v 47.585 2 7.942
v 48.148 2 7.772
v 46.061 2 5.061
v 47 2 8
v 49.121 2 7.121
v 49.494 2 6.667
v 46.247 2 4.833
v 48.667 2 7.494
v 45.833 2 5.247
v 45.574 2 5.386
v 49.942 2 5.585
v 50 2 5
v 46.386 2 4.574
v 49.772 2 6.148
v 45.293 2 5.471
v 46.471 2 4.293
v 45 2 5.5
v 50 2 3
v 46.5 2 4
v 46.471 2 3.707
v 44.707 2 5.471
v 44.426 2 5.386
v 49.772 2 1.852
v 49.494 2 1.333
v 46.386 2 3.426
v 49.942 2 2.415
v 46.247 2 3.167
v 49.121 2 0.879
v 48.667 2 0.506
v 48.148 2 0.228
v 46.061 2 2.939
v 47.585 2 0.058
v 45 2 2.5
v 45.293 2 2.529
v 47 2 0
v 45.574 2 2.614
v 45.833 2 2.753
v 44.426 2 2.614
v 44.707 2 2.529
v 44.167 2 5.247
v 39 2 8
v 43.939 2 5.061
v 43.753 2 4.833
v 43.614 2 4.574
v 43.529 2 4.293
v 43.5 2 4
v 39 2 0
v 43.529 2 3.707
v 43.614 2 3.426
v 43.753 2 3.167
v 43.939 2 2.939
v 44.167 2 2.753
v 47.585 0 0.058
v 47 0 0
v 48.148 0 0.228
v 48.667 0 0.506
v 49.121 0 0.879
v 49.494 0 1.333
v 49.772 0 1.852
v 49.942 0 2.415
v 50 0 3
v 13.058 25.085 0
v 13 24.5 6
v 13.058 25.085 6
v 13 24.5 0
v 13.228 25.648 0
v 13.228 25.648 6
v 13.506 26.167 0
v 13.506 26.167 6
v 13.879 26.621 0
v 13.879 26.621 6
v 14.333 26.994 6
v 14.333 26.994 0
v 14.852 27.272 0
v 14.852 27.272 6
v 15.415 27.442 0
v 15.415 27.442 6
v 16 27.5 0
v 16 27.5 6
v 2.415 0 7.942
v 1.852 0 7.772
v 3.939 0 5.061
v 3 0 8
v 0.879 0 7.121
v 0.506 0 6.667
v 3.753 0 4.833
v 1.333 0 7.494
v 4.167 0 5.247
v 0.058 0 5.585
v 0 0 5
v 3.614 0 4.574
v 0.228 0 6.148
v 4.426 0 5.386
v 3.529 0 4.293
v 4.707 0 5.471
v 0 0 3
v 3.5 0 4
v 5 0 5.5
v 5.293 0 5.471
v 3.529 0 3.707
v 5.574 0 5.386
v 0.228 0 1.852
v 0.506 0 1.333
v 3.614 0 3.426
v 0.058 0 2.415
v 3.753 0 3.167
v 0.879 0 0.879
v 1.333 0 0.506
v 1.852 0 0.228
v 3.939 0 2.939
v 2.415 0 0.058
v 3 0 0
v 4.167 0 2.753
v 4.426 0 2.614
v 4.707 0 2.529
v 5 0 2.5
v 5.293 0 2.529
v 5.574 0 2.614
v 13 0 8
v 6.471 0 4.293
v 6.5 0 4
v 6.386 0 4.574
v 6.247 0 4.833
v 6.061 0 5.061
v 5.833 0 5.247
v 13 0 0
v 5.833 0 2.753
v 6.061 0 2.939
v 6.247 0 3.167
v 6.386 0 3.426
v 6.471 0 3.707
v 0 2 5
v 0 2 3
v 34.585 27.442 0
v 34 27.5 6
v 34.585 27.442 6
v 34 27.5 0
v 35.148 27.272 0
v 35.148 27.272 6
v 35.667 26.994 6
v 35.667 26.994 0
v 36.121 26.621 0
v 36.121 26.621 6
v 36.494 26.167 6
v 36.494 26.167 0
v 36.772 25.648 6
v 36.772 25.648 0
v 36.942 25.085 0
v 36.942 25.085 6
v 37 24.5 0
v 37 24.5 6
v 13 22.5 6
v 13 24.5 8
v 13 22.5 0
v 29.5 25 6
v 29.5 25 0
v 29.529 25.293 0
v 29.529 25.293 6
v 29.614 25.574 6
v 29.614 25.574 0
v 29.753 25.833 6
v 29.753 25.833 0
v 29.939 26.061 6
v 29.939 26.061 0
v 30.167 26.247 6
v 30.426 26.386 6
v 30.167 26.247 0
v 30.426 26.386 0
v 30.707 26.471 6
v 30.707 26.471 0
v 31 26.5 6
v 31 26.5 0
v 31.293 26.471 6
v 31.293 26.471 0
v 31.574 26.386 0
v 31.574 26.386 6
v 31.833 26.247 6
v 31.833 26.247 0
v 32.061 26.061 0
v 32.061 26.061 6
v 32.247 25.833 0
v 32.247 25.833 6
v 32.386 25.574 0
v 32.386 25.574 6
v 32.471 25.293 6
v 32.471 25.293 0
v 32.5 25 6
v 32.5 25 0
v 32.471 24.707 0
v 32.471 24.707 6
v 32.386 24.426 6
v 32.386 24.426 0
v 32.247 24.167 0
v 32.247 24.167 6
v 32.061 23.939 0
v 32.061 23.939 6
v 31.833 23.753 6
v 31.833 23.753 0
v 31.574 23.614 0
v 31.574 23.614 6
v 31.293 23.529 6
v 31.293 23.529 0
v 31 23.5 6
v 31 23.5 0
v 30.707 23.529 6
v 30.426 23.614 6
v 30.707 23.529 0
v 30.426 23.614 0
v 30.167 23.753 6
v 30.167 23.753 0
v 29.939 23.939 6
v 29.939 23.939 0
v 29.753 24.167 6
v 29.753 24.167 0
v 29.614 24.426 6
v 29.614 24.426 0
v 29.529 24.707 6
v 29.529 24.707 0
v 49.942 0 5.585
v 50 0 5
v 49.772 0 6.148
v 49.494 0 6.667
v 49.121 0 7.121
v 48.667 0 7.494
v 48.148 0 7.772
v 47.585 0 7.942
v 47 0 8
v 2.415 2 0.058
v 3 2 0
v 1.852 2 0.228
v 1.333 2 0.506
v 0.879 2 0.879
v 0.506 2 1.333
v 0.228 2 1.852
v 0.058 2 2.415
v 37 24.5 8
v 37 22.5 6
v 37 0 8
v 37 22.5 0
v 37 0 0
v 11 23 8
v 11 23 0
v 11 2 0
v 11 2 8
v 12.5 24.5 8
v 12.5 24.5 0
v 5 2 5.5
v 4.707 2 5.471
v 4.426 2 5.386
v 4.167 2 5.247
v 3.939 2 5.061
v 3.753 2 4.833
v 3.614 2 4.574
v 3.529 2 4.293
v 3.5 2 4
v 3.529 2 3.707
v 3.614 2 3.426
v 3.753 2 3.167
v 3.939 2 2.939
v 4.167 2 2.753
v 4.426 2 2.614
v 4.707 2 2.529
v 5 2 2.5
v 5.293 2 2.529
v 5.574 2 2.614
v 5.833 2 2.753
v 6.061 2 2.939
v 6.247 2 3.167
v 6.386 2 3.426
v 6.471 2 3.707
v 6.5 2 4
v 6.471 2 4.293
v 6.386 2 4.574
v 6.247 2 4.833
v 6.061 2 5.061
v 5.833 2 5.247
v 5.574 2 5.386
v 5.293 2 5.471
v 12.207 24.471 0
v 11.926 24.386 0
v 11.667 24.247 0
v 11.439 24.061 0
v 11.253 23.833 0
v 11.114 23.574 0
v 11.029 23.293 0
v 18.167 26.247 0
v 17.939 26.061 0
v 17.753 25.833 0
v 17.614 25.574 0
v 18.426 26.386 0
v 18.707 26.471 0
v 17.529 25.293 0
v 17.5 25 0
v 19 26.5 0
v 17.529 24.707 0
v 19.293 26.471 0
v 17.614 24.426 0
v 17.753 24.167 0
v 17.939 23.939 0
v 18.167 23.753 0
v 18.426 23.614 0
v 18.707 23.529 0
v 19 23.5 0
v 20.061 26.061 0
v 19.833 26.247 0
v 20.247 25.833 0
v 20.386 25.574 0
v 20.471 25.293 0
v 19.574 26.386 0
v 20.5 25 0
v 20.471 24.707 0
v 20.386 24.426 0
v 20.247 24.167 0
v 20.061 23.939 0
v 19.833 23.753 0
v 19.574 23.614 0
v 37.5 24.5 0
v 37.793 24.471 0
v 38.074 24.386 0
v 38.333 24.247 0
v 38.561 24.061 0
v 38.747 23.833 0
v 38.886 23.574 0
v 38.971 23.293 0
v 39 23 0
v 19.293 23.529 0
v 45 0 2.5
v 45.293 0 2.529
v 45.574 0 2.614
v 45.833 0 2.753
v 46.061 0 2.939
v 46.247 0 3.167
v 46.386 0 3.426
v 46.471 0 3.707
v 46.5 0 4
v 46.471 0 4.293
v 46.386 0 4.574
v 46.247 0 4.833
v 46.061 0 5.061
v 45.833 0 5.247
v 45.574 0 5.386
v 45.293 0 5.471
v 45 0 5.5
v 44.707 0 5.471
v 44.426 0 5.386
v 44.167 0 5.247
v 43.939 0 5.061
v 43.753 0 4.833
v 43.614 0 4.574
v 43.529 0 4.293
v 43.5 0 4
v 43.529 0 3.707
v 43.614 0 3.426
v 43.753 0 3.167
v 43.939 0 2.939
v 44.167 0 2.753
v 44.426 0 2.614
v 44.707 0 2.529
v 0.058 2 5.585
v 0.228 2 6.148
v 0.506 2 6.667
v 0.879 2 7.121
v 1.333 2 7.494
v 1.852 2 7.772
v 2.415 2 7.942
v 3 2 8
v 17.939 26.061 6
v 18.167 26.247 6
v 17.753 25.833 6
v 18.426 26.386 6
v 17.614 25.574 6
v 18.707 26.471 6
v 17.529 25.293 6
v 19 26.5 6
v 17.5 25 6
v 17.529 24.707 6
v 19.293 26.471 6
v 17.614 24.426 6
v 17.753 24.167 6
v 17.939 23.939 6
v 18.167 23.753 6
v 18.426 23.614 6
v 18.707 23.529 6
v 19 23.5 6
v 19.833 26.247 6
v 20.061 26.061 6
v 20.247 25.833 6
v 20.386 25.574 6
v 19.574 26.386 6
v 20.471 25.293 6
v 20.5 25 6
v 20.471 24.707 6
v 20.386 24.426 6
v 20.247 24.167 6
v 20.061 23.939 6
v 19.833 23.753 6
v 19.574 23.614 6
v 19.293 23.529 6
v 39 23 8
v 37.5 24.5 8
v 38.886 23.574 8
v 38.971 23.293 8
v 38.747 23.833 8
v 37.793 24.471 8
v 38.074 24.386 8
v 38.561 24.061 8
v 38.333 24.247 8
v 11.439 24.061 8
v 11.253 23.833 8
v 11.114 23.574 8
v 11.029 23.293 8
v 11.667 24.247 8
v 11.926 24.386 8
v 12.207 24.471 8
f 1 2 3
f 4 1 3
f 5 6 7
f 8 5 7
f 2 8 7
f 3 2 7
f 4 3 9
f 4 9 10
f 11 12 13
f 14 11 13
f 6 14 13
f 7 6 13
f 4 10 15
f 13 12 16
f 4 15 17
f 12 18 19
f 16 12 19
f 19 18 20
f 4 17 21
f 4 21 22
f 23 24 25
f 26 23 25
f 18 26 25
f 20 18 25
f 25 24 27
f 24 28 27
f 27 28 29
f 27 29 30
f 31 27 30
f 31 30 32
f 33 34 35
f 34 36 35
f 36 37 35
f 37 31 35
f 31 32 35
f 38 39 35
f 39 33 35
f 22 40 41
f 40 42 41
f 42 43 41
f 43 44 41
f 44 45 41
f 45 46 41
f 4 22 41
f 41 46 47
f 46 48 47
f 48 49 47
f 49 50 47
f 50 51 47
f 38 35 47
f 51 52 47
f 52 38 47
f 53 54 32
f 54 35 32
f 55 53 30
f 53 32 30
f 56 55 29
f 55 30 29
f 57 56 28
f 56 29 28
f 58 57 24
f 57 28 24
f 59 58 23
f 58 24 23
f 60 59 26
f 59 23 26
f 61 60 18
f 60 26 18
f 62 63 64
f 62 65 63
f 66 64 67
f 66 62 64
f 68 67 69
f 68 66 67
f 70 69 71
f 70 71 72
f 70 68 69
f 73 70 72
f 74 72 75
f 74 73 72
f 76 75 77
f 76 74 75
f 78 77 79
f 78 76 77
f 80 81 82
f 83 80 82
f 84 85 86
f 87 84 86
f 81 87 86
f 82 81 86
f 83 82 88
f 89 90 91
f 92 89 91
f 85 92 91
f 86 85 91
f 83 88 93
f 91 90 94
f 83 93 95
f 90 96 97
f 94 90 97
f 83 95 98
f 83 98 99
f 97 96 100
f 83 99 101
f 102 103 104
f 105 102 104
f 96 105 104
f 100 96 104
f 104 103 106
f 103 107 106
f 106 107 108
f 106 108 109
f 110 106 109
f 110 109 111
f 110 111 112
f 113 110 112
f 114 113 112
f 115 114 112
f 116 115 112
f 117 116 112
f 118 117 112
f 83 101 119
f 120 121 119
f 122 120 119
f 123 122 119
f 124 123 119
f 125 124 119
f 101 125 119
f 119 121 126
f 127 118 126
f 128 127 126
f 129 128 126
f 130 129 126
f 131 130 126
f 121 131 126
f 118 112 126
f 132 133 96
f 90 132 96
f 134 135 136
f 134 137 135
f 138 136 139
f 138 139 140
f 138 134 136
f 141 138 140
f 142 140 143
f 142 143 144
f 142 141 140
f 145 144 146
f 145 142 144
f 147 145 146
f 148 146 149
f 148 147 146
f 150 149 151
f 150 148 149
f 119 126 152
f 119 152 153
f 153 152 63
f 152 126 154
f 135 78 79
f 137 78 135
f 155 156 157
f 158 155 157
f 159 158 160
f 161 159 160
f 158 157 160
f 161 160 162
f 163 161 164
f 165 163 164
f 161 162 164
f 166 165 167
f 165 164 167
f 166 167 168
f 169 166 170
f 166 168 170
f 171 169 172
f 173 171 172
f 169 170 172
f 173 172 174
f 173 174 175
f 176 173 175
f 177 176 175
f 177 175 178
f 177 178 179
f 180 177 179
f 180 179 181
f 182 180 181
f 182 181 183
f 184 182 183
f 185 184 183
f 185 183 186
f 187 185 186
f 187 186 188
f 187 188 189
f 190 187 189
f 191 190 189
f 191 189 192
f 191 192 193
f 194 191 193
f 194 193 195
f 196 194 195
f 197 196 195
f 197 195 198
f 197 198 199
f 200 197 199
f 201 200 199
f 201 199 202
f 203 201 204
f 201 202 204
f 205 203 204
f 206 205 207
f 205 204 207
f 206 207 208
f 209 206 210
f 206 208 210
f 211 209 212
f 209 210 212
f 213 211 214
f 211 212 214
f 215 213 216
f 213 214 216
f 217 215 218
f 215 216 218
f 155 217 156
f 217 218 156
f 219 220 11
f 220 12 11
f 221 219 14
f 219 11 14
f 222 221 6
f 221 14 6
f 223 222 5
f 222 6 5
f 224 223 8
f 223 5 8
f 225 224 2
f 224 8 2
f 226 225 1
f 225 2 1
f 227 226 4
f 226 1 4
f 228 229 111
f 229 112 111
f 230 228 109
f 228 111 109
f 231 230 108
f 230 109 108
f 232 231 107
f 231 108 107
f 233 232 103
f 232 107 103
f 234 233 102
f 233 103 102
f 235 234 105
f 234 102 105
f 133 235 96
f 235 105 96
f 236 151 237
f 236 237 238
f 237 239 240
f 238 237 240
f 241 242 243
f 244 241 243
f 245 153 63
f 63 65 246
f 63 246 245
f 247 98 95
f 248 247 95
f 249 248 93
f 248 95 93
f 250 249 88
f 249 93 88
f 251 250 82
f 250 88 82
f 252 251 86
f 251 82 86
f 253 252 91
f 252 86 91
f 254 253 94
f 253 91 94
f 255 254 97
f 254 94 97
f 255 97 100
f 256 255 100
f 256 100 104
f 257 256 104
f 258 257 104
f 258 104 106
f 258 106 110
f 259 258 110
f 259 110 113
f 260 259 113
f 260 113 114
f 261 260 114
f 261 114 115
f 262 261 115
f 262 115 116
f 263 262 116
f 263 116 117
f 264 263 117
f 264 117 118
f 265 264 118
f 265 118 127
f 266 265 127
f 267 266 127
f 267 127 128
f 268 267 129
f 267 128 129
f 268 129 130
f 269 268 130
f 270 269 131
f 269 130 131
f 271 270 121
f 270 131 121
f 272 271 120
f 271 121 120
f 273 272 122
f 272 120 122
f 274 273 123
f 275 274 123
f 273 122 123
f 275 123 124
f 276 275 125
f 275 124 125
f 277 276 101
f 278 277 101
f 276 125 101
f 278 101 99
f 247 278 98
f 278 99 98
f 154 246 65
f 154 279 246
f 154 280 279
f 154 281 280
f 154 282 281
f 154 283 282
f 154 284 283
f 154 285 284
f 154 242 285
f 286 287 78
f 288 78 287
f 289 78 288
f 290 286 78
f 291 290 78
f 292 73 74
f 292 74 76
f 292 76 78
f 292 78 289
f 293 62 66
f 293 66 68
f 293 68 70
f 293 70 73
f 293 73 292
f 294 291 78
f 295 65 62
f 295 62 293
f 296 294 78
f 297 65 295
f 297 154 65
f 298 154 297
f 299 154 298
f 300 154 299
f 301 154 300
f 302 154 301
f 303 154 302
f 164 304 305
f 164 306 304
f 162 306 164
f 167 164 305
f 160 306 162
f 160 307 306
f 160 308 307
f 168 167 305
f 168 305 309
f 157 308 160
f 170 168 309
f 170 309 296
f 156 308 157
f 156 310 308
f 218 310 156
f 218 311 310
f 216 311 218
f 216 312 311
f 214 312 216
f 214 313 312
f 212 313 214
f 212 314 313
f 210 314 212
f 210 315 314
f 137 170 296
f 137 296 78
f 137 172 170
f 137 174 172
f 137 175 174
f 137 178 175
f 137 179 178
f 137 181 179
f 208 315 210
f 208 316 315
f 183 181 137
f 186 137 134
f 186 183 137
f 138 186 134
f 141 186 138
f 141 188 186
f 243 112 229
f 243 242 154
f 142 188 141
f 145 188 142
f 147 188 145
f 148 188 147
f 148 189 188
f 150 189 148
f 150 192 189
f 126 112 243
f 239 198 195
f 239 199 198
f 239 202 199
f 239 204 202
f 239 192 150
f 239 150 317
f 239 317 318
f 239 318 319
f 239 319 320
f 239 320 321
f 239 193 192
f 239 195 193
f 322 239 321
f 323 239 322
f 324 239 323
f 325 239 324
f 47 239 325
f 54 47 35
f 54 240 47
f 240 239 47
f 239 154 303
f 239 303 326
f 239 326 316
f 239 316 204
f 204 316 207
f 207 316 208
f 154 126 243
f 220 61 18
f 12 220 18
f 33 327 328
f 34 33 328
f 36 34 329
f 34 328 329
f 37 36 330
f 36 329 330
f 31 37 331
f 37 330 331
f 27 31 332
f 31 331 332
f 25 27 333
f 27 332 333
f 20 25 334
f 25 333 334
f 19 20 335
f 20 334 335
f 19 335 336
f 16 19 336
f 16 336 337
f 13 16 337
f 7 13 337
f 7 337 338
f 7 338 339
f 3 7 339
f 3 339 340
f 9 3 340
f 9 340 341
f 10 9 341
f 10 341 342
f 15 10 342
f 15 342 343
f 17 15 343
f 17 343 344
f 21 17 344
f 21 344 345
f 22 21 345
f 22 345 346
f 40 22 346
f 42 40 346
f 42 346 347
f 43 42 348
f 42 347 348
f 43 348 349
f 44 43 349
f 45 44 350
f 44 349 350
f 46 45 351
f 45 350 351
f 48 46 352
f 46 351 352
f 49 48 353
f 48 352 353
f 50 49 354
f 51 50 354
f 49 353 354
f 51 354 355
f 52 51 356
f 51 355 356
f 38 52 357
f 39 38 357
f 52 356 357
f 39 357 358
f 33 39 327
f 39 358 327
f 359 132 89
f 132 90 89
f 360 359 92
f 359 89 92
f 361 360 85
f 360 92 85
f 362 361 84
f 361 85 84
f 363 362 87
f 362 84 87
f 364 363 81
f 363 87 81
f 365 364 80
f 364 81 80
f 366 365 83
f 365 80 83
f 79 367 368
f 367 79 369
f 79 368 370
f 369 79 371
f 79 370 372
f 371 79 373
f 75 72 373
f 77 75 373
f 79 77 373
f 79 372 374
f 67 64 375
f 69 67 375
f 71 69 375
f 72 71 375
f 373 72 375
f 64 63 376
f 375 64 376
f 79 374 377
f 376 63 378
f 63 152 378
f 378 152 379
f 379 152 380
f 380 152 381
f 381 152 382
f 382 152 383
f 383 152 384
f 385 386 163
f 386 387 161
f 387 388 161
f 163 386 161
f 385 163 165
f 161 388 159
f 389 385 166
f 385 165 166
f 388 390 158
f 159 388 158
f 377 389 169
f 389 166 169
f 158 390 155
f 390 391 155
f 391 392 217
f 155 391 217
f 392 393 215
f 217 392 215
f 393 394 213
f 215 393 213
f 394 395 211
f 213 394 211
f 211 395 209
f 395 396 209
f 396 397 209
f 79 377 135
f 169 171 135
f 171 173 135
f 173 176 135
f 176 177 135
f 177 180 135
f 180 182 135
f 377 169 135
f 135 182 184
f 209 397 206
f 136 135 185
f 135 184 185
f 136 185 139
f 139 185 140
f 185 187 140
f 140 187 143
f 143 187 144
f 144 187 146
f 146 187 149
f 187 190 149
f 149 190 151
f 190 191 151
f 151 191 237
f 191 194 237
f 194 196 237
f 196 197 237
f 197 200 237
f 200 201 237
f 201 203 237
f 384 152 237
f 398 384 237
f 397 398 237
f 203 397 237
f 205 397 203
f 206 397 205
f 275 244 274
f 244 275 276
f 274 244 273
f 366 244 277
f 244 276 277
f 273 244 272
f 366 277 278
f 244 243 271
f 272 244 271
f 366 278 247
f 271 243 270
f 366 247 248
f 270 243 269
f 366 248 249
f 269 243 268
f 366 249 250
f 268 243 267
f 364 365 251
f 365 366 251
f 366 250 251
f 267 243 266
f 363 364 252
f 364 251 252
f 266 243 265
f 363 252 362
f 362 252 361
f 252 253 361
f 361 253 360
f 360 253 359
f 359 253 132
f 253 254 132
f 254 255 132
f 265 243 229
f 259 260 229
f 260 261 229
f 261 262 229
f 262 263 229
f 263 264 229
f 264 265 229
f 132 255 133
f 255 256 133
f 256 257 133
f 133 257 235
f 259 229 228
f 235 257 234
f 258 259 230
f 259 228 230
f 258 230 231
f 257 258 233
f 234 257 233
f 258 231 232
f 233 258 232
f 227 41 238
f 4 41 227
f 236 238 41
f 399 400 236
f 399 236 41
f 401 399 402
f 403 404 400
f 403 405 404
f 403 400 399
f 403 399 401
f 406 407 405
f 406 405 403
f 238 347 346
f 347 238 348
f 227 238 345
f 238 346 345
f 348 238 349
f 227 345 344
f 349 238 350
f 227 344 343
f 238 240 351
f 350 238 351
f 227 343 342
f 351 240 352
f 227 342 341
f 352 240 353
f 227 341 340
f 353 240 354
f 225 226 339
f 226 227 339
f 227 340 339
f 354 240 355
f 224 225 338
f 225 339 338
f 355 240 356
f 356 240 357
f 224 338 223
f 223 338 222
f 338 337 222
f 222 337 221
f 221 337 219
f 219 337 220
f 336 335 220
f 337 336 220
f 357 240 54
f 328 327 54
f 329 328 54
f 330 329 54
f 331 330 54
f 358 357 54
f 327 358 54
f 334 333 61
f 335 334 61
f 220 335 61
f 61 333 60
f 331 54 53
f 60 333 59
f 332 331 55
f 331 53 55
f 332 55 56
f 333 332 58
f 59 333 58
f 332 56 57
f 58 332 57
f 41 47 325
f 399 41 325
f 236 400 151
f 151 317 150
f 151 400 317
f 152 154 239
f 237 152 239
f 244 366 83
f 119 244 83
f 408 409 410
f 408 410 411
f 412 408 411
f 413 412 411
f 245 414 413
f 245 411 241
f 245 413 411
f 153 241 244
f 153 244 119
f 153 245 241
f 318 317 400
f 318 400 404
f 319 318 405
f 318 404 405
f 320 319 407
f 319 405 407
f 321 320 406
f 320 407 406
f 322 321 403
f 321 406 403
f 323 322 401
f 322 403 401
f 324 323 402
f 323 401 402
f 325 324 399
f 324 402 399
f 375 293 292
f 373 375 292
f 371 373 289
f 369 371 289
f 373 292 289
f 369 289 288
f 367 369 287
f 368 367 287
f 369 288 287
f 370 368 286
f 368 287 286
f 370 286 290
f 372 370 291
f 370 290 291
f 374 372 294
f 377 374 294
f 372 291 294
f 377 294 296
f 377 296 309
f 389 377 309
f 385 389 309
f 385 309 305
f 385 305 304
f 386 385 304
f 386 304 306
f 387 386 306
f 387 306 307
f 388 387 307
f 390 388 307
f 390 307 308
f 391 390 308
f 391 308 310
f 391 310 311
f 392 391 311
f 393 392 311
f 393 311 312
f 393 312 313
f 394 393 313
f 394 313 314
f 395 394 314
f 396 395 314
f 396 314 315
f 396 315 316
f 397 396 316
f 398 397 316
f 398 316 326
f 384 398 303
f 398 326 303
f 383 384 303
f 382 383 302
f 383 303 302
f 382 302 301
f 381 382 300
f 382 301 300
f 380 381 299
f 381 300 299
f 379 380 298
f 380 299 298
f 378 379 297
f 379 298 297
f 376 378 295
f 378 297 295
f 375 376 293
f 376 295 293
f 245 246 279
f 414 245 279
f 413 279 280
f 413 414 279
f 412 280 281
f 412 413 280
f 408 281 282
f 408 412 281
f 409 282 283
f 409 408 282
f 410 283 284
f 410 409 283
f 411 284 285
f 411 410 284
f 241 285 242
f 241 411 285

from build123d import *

# Parameters (mm, degrees)
EXTRUIR_L_MINA1_DEPTH   = 8
CROQUIS2_W              = 24
CROQUIS2_H              = 2
CORTAR_EXTRUIR1_DEPTH   = 2
CROQUIS3_W              = 24
CROQUIS3_H              = 6
SALIENTE_EXTRUIR1_DEPTH = 3
CROQUIS4_R              = 1.5
CORTAR_EXTRUIR2_DEPTH   = 58.621610529
CROQUIS5_R              = 1.5
CORTAR_EXTRUIR3_DEPTH   = 58.621610529
REDONDEO1_R             = 3
REDONDEO2_R             = 1.5


with BuildPart() as part:
    # Croquis1 → Extruir-Lámina1 (new body)
    with BuildSketch(Plane.XY):
        Polygon((0, 0), (13, 0), (13, 22.5), (37, 22.5), (37, 0), (50, 0), (50, 2), (39, 2), (39, 24.5), (11, 24.5), (11, 2), (0, 2), align=None)
    extrude(amount=EXTRUIR_L_MINA1_DEPTH)

    # Croquis2 → Cortar-Extruir1 (cut)
    with BuildSketch(Plane.XY.offset(8)):
        with Locations((25, 23.5)):
            Rectangle(CROQUIS2_W, CROQUIS2_H)
    extrude(amount=-CORTAR_EXTRUIR1_DEPTH, mode=Mode.SUBTRACT)

    # Croquis3 → Saliente-Extruir1 (add)
    with BuildSketch(Plane(origin=(0, 24.5, 0), x_dir=(1, 0, 0), z_dir=(0, 1, 0))):
        with Locations((25, -3)):
            Rectangle(CROQUIS3_W, CROQUIS3_H)
    extrude(amount=SALIENTE_EXTRUIR1_DEPTH)

    # Croquis4 → Cortar-Extruir2 (cut, through all)
    with BuildSketch(Plane(origin=(0, 0, 0), x_dir=(-1, 0, 0), z_dir=(0, 0, -1))):
        with Locations((-19, 25)):
            Circle(CROQUIS4_R)
        with Locations((-31, 25)):
            Circle(CROQUIS4_R)
    extrude(amount=-CORTAR_EXTRUIR2_DEPTH, mode=Mode.SUBTRACT)

    # Croquis5 → Cortar-Extruir3 (cut, through all)
    with BuildSketch(Plane.XZ):
        with Locations(Location((45, 4, 0), (0, 0, 270))):
            Circle(CROQUIS5_R)
        with Locations(Location((5, 4, 0), (0, 0, 90))):
            Circle(CROQUIS5_R)
    extrude(amount=-CORTAR_EXTRUIR3_DEPTH, mode=Mode.SUBTRACT)

    # Redondeo1
    redondeo1_edges = [part.edges().sort_by_distance(p)[0] for p in [
        (13, 27.5, 3),
        (37, 27.5, 3),
        (50, 1, 8),
        (50, 1, 0),
        (0, 1, 0),
        (0, 1, 8),
    ]]
    fillet(redondeo1_edges, radius=REDONDEO1_R - 0.0001)  # a hair under: the kernel refuses the full size

    # Redondeo2
    redondeo2_edges = [part.edges().sort_by_distance(p)[0] for p in [
        (11, 24.5, 4),
        (39, 24.5, 4),
    ]]
    fillet(redondeo2_edges, radius=REDONDEO2_R)


solid = part.part
